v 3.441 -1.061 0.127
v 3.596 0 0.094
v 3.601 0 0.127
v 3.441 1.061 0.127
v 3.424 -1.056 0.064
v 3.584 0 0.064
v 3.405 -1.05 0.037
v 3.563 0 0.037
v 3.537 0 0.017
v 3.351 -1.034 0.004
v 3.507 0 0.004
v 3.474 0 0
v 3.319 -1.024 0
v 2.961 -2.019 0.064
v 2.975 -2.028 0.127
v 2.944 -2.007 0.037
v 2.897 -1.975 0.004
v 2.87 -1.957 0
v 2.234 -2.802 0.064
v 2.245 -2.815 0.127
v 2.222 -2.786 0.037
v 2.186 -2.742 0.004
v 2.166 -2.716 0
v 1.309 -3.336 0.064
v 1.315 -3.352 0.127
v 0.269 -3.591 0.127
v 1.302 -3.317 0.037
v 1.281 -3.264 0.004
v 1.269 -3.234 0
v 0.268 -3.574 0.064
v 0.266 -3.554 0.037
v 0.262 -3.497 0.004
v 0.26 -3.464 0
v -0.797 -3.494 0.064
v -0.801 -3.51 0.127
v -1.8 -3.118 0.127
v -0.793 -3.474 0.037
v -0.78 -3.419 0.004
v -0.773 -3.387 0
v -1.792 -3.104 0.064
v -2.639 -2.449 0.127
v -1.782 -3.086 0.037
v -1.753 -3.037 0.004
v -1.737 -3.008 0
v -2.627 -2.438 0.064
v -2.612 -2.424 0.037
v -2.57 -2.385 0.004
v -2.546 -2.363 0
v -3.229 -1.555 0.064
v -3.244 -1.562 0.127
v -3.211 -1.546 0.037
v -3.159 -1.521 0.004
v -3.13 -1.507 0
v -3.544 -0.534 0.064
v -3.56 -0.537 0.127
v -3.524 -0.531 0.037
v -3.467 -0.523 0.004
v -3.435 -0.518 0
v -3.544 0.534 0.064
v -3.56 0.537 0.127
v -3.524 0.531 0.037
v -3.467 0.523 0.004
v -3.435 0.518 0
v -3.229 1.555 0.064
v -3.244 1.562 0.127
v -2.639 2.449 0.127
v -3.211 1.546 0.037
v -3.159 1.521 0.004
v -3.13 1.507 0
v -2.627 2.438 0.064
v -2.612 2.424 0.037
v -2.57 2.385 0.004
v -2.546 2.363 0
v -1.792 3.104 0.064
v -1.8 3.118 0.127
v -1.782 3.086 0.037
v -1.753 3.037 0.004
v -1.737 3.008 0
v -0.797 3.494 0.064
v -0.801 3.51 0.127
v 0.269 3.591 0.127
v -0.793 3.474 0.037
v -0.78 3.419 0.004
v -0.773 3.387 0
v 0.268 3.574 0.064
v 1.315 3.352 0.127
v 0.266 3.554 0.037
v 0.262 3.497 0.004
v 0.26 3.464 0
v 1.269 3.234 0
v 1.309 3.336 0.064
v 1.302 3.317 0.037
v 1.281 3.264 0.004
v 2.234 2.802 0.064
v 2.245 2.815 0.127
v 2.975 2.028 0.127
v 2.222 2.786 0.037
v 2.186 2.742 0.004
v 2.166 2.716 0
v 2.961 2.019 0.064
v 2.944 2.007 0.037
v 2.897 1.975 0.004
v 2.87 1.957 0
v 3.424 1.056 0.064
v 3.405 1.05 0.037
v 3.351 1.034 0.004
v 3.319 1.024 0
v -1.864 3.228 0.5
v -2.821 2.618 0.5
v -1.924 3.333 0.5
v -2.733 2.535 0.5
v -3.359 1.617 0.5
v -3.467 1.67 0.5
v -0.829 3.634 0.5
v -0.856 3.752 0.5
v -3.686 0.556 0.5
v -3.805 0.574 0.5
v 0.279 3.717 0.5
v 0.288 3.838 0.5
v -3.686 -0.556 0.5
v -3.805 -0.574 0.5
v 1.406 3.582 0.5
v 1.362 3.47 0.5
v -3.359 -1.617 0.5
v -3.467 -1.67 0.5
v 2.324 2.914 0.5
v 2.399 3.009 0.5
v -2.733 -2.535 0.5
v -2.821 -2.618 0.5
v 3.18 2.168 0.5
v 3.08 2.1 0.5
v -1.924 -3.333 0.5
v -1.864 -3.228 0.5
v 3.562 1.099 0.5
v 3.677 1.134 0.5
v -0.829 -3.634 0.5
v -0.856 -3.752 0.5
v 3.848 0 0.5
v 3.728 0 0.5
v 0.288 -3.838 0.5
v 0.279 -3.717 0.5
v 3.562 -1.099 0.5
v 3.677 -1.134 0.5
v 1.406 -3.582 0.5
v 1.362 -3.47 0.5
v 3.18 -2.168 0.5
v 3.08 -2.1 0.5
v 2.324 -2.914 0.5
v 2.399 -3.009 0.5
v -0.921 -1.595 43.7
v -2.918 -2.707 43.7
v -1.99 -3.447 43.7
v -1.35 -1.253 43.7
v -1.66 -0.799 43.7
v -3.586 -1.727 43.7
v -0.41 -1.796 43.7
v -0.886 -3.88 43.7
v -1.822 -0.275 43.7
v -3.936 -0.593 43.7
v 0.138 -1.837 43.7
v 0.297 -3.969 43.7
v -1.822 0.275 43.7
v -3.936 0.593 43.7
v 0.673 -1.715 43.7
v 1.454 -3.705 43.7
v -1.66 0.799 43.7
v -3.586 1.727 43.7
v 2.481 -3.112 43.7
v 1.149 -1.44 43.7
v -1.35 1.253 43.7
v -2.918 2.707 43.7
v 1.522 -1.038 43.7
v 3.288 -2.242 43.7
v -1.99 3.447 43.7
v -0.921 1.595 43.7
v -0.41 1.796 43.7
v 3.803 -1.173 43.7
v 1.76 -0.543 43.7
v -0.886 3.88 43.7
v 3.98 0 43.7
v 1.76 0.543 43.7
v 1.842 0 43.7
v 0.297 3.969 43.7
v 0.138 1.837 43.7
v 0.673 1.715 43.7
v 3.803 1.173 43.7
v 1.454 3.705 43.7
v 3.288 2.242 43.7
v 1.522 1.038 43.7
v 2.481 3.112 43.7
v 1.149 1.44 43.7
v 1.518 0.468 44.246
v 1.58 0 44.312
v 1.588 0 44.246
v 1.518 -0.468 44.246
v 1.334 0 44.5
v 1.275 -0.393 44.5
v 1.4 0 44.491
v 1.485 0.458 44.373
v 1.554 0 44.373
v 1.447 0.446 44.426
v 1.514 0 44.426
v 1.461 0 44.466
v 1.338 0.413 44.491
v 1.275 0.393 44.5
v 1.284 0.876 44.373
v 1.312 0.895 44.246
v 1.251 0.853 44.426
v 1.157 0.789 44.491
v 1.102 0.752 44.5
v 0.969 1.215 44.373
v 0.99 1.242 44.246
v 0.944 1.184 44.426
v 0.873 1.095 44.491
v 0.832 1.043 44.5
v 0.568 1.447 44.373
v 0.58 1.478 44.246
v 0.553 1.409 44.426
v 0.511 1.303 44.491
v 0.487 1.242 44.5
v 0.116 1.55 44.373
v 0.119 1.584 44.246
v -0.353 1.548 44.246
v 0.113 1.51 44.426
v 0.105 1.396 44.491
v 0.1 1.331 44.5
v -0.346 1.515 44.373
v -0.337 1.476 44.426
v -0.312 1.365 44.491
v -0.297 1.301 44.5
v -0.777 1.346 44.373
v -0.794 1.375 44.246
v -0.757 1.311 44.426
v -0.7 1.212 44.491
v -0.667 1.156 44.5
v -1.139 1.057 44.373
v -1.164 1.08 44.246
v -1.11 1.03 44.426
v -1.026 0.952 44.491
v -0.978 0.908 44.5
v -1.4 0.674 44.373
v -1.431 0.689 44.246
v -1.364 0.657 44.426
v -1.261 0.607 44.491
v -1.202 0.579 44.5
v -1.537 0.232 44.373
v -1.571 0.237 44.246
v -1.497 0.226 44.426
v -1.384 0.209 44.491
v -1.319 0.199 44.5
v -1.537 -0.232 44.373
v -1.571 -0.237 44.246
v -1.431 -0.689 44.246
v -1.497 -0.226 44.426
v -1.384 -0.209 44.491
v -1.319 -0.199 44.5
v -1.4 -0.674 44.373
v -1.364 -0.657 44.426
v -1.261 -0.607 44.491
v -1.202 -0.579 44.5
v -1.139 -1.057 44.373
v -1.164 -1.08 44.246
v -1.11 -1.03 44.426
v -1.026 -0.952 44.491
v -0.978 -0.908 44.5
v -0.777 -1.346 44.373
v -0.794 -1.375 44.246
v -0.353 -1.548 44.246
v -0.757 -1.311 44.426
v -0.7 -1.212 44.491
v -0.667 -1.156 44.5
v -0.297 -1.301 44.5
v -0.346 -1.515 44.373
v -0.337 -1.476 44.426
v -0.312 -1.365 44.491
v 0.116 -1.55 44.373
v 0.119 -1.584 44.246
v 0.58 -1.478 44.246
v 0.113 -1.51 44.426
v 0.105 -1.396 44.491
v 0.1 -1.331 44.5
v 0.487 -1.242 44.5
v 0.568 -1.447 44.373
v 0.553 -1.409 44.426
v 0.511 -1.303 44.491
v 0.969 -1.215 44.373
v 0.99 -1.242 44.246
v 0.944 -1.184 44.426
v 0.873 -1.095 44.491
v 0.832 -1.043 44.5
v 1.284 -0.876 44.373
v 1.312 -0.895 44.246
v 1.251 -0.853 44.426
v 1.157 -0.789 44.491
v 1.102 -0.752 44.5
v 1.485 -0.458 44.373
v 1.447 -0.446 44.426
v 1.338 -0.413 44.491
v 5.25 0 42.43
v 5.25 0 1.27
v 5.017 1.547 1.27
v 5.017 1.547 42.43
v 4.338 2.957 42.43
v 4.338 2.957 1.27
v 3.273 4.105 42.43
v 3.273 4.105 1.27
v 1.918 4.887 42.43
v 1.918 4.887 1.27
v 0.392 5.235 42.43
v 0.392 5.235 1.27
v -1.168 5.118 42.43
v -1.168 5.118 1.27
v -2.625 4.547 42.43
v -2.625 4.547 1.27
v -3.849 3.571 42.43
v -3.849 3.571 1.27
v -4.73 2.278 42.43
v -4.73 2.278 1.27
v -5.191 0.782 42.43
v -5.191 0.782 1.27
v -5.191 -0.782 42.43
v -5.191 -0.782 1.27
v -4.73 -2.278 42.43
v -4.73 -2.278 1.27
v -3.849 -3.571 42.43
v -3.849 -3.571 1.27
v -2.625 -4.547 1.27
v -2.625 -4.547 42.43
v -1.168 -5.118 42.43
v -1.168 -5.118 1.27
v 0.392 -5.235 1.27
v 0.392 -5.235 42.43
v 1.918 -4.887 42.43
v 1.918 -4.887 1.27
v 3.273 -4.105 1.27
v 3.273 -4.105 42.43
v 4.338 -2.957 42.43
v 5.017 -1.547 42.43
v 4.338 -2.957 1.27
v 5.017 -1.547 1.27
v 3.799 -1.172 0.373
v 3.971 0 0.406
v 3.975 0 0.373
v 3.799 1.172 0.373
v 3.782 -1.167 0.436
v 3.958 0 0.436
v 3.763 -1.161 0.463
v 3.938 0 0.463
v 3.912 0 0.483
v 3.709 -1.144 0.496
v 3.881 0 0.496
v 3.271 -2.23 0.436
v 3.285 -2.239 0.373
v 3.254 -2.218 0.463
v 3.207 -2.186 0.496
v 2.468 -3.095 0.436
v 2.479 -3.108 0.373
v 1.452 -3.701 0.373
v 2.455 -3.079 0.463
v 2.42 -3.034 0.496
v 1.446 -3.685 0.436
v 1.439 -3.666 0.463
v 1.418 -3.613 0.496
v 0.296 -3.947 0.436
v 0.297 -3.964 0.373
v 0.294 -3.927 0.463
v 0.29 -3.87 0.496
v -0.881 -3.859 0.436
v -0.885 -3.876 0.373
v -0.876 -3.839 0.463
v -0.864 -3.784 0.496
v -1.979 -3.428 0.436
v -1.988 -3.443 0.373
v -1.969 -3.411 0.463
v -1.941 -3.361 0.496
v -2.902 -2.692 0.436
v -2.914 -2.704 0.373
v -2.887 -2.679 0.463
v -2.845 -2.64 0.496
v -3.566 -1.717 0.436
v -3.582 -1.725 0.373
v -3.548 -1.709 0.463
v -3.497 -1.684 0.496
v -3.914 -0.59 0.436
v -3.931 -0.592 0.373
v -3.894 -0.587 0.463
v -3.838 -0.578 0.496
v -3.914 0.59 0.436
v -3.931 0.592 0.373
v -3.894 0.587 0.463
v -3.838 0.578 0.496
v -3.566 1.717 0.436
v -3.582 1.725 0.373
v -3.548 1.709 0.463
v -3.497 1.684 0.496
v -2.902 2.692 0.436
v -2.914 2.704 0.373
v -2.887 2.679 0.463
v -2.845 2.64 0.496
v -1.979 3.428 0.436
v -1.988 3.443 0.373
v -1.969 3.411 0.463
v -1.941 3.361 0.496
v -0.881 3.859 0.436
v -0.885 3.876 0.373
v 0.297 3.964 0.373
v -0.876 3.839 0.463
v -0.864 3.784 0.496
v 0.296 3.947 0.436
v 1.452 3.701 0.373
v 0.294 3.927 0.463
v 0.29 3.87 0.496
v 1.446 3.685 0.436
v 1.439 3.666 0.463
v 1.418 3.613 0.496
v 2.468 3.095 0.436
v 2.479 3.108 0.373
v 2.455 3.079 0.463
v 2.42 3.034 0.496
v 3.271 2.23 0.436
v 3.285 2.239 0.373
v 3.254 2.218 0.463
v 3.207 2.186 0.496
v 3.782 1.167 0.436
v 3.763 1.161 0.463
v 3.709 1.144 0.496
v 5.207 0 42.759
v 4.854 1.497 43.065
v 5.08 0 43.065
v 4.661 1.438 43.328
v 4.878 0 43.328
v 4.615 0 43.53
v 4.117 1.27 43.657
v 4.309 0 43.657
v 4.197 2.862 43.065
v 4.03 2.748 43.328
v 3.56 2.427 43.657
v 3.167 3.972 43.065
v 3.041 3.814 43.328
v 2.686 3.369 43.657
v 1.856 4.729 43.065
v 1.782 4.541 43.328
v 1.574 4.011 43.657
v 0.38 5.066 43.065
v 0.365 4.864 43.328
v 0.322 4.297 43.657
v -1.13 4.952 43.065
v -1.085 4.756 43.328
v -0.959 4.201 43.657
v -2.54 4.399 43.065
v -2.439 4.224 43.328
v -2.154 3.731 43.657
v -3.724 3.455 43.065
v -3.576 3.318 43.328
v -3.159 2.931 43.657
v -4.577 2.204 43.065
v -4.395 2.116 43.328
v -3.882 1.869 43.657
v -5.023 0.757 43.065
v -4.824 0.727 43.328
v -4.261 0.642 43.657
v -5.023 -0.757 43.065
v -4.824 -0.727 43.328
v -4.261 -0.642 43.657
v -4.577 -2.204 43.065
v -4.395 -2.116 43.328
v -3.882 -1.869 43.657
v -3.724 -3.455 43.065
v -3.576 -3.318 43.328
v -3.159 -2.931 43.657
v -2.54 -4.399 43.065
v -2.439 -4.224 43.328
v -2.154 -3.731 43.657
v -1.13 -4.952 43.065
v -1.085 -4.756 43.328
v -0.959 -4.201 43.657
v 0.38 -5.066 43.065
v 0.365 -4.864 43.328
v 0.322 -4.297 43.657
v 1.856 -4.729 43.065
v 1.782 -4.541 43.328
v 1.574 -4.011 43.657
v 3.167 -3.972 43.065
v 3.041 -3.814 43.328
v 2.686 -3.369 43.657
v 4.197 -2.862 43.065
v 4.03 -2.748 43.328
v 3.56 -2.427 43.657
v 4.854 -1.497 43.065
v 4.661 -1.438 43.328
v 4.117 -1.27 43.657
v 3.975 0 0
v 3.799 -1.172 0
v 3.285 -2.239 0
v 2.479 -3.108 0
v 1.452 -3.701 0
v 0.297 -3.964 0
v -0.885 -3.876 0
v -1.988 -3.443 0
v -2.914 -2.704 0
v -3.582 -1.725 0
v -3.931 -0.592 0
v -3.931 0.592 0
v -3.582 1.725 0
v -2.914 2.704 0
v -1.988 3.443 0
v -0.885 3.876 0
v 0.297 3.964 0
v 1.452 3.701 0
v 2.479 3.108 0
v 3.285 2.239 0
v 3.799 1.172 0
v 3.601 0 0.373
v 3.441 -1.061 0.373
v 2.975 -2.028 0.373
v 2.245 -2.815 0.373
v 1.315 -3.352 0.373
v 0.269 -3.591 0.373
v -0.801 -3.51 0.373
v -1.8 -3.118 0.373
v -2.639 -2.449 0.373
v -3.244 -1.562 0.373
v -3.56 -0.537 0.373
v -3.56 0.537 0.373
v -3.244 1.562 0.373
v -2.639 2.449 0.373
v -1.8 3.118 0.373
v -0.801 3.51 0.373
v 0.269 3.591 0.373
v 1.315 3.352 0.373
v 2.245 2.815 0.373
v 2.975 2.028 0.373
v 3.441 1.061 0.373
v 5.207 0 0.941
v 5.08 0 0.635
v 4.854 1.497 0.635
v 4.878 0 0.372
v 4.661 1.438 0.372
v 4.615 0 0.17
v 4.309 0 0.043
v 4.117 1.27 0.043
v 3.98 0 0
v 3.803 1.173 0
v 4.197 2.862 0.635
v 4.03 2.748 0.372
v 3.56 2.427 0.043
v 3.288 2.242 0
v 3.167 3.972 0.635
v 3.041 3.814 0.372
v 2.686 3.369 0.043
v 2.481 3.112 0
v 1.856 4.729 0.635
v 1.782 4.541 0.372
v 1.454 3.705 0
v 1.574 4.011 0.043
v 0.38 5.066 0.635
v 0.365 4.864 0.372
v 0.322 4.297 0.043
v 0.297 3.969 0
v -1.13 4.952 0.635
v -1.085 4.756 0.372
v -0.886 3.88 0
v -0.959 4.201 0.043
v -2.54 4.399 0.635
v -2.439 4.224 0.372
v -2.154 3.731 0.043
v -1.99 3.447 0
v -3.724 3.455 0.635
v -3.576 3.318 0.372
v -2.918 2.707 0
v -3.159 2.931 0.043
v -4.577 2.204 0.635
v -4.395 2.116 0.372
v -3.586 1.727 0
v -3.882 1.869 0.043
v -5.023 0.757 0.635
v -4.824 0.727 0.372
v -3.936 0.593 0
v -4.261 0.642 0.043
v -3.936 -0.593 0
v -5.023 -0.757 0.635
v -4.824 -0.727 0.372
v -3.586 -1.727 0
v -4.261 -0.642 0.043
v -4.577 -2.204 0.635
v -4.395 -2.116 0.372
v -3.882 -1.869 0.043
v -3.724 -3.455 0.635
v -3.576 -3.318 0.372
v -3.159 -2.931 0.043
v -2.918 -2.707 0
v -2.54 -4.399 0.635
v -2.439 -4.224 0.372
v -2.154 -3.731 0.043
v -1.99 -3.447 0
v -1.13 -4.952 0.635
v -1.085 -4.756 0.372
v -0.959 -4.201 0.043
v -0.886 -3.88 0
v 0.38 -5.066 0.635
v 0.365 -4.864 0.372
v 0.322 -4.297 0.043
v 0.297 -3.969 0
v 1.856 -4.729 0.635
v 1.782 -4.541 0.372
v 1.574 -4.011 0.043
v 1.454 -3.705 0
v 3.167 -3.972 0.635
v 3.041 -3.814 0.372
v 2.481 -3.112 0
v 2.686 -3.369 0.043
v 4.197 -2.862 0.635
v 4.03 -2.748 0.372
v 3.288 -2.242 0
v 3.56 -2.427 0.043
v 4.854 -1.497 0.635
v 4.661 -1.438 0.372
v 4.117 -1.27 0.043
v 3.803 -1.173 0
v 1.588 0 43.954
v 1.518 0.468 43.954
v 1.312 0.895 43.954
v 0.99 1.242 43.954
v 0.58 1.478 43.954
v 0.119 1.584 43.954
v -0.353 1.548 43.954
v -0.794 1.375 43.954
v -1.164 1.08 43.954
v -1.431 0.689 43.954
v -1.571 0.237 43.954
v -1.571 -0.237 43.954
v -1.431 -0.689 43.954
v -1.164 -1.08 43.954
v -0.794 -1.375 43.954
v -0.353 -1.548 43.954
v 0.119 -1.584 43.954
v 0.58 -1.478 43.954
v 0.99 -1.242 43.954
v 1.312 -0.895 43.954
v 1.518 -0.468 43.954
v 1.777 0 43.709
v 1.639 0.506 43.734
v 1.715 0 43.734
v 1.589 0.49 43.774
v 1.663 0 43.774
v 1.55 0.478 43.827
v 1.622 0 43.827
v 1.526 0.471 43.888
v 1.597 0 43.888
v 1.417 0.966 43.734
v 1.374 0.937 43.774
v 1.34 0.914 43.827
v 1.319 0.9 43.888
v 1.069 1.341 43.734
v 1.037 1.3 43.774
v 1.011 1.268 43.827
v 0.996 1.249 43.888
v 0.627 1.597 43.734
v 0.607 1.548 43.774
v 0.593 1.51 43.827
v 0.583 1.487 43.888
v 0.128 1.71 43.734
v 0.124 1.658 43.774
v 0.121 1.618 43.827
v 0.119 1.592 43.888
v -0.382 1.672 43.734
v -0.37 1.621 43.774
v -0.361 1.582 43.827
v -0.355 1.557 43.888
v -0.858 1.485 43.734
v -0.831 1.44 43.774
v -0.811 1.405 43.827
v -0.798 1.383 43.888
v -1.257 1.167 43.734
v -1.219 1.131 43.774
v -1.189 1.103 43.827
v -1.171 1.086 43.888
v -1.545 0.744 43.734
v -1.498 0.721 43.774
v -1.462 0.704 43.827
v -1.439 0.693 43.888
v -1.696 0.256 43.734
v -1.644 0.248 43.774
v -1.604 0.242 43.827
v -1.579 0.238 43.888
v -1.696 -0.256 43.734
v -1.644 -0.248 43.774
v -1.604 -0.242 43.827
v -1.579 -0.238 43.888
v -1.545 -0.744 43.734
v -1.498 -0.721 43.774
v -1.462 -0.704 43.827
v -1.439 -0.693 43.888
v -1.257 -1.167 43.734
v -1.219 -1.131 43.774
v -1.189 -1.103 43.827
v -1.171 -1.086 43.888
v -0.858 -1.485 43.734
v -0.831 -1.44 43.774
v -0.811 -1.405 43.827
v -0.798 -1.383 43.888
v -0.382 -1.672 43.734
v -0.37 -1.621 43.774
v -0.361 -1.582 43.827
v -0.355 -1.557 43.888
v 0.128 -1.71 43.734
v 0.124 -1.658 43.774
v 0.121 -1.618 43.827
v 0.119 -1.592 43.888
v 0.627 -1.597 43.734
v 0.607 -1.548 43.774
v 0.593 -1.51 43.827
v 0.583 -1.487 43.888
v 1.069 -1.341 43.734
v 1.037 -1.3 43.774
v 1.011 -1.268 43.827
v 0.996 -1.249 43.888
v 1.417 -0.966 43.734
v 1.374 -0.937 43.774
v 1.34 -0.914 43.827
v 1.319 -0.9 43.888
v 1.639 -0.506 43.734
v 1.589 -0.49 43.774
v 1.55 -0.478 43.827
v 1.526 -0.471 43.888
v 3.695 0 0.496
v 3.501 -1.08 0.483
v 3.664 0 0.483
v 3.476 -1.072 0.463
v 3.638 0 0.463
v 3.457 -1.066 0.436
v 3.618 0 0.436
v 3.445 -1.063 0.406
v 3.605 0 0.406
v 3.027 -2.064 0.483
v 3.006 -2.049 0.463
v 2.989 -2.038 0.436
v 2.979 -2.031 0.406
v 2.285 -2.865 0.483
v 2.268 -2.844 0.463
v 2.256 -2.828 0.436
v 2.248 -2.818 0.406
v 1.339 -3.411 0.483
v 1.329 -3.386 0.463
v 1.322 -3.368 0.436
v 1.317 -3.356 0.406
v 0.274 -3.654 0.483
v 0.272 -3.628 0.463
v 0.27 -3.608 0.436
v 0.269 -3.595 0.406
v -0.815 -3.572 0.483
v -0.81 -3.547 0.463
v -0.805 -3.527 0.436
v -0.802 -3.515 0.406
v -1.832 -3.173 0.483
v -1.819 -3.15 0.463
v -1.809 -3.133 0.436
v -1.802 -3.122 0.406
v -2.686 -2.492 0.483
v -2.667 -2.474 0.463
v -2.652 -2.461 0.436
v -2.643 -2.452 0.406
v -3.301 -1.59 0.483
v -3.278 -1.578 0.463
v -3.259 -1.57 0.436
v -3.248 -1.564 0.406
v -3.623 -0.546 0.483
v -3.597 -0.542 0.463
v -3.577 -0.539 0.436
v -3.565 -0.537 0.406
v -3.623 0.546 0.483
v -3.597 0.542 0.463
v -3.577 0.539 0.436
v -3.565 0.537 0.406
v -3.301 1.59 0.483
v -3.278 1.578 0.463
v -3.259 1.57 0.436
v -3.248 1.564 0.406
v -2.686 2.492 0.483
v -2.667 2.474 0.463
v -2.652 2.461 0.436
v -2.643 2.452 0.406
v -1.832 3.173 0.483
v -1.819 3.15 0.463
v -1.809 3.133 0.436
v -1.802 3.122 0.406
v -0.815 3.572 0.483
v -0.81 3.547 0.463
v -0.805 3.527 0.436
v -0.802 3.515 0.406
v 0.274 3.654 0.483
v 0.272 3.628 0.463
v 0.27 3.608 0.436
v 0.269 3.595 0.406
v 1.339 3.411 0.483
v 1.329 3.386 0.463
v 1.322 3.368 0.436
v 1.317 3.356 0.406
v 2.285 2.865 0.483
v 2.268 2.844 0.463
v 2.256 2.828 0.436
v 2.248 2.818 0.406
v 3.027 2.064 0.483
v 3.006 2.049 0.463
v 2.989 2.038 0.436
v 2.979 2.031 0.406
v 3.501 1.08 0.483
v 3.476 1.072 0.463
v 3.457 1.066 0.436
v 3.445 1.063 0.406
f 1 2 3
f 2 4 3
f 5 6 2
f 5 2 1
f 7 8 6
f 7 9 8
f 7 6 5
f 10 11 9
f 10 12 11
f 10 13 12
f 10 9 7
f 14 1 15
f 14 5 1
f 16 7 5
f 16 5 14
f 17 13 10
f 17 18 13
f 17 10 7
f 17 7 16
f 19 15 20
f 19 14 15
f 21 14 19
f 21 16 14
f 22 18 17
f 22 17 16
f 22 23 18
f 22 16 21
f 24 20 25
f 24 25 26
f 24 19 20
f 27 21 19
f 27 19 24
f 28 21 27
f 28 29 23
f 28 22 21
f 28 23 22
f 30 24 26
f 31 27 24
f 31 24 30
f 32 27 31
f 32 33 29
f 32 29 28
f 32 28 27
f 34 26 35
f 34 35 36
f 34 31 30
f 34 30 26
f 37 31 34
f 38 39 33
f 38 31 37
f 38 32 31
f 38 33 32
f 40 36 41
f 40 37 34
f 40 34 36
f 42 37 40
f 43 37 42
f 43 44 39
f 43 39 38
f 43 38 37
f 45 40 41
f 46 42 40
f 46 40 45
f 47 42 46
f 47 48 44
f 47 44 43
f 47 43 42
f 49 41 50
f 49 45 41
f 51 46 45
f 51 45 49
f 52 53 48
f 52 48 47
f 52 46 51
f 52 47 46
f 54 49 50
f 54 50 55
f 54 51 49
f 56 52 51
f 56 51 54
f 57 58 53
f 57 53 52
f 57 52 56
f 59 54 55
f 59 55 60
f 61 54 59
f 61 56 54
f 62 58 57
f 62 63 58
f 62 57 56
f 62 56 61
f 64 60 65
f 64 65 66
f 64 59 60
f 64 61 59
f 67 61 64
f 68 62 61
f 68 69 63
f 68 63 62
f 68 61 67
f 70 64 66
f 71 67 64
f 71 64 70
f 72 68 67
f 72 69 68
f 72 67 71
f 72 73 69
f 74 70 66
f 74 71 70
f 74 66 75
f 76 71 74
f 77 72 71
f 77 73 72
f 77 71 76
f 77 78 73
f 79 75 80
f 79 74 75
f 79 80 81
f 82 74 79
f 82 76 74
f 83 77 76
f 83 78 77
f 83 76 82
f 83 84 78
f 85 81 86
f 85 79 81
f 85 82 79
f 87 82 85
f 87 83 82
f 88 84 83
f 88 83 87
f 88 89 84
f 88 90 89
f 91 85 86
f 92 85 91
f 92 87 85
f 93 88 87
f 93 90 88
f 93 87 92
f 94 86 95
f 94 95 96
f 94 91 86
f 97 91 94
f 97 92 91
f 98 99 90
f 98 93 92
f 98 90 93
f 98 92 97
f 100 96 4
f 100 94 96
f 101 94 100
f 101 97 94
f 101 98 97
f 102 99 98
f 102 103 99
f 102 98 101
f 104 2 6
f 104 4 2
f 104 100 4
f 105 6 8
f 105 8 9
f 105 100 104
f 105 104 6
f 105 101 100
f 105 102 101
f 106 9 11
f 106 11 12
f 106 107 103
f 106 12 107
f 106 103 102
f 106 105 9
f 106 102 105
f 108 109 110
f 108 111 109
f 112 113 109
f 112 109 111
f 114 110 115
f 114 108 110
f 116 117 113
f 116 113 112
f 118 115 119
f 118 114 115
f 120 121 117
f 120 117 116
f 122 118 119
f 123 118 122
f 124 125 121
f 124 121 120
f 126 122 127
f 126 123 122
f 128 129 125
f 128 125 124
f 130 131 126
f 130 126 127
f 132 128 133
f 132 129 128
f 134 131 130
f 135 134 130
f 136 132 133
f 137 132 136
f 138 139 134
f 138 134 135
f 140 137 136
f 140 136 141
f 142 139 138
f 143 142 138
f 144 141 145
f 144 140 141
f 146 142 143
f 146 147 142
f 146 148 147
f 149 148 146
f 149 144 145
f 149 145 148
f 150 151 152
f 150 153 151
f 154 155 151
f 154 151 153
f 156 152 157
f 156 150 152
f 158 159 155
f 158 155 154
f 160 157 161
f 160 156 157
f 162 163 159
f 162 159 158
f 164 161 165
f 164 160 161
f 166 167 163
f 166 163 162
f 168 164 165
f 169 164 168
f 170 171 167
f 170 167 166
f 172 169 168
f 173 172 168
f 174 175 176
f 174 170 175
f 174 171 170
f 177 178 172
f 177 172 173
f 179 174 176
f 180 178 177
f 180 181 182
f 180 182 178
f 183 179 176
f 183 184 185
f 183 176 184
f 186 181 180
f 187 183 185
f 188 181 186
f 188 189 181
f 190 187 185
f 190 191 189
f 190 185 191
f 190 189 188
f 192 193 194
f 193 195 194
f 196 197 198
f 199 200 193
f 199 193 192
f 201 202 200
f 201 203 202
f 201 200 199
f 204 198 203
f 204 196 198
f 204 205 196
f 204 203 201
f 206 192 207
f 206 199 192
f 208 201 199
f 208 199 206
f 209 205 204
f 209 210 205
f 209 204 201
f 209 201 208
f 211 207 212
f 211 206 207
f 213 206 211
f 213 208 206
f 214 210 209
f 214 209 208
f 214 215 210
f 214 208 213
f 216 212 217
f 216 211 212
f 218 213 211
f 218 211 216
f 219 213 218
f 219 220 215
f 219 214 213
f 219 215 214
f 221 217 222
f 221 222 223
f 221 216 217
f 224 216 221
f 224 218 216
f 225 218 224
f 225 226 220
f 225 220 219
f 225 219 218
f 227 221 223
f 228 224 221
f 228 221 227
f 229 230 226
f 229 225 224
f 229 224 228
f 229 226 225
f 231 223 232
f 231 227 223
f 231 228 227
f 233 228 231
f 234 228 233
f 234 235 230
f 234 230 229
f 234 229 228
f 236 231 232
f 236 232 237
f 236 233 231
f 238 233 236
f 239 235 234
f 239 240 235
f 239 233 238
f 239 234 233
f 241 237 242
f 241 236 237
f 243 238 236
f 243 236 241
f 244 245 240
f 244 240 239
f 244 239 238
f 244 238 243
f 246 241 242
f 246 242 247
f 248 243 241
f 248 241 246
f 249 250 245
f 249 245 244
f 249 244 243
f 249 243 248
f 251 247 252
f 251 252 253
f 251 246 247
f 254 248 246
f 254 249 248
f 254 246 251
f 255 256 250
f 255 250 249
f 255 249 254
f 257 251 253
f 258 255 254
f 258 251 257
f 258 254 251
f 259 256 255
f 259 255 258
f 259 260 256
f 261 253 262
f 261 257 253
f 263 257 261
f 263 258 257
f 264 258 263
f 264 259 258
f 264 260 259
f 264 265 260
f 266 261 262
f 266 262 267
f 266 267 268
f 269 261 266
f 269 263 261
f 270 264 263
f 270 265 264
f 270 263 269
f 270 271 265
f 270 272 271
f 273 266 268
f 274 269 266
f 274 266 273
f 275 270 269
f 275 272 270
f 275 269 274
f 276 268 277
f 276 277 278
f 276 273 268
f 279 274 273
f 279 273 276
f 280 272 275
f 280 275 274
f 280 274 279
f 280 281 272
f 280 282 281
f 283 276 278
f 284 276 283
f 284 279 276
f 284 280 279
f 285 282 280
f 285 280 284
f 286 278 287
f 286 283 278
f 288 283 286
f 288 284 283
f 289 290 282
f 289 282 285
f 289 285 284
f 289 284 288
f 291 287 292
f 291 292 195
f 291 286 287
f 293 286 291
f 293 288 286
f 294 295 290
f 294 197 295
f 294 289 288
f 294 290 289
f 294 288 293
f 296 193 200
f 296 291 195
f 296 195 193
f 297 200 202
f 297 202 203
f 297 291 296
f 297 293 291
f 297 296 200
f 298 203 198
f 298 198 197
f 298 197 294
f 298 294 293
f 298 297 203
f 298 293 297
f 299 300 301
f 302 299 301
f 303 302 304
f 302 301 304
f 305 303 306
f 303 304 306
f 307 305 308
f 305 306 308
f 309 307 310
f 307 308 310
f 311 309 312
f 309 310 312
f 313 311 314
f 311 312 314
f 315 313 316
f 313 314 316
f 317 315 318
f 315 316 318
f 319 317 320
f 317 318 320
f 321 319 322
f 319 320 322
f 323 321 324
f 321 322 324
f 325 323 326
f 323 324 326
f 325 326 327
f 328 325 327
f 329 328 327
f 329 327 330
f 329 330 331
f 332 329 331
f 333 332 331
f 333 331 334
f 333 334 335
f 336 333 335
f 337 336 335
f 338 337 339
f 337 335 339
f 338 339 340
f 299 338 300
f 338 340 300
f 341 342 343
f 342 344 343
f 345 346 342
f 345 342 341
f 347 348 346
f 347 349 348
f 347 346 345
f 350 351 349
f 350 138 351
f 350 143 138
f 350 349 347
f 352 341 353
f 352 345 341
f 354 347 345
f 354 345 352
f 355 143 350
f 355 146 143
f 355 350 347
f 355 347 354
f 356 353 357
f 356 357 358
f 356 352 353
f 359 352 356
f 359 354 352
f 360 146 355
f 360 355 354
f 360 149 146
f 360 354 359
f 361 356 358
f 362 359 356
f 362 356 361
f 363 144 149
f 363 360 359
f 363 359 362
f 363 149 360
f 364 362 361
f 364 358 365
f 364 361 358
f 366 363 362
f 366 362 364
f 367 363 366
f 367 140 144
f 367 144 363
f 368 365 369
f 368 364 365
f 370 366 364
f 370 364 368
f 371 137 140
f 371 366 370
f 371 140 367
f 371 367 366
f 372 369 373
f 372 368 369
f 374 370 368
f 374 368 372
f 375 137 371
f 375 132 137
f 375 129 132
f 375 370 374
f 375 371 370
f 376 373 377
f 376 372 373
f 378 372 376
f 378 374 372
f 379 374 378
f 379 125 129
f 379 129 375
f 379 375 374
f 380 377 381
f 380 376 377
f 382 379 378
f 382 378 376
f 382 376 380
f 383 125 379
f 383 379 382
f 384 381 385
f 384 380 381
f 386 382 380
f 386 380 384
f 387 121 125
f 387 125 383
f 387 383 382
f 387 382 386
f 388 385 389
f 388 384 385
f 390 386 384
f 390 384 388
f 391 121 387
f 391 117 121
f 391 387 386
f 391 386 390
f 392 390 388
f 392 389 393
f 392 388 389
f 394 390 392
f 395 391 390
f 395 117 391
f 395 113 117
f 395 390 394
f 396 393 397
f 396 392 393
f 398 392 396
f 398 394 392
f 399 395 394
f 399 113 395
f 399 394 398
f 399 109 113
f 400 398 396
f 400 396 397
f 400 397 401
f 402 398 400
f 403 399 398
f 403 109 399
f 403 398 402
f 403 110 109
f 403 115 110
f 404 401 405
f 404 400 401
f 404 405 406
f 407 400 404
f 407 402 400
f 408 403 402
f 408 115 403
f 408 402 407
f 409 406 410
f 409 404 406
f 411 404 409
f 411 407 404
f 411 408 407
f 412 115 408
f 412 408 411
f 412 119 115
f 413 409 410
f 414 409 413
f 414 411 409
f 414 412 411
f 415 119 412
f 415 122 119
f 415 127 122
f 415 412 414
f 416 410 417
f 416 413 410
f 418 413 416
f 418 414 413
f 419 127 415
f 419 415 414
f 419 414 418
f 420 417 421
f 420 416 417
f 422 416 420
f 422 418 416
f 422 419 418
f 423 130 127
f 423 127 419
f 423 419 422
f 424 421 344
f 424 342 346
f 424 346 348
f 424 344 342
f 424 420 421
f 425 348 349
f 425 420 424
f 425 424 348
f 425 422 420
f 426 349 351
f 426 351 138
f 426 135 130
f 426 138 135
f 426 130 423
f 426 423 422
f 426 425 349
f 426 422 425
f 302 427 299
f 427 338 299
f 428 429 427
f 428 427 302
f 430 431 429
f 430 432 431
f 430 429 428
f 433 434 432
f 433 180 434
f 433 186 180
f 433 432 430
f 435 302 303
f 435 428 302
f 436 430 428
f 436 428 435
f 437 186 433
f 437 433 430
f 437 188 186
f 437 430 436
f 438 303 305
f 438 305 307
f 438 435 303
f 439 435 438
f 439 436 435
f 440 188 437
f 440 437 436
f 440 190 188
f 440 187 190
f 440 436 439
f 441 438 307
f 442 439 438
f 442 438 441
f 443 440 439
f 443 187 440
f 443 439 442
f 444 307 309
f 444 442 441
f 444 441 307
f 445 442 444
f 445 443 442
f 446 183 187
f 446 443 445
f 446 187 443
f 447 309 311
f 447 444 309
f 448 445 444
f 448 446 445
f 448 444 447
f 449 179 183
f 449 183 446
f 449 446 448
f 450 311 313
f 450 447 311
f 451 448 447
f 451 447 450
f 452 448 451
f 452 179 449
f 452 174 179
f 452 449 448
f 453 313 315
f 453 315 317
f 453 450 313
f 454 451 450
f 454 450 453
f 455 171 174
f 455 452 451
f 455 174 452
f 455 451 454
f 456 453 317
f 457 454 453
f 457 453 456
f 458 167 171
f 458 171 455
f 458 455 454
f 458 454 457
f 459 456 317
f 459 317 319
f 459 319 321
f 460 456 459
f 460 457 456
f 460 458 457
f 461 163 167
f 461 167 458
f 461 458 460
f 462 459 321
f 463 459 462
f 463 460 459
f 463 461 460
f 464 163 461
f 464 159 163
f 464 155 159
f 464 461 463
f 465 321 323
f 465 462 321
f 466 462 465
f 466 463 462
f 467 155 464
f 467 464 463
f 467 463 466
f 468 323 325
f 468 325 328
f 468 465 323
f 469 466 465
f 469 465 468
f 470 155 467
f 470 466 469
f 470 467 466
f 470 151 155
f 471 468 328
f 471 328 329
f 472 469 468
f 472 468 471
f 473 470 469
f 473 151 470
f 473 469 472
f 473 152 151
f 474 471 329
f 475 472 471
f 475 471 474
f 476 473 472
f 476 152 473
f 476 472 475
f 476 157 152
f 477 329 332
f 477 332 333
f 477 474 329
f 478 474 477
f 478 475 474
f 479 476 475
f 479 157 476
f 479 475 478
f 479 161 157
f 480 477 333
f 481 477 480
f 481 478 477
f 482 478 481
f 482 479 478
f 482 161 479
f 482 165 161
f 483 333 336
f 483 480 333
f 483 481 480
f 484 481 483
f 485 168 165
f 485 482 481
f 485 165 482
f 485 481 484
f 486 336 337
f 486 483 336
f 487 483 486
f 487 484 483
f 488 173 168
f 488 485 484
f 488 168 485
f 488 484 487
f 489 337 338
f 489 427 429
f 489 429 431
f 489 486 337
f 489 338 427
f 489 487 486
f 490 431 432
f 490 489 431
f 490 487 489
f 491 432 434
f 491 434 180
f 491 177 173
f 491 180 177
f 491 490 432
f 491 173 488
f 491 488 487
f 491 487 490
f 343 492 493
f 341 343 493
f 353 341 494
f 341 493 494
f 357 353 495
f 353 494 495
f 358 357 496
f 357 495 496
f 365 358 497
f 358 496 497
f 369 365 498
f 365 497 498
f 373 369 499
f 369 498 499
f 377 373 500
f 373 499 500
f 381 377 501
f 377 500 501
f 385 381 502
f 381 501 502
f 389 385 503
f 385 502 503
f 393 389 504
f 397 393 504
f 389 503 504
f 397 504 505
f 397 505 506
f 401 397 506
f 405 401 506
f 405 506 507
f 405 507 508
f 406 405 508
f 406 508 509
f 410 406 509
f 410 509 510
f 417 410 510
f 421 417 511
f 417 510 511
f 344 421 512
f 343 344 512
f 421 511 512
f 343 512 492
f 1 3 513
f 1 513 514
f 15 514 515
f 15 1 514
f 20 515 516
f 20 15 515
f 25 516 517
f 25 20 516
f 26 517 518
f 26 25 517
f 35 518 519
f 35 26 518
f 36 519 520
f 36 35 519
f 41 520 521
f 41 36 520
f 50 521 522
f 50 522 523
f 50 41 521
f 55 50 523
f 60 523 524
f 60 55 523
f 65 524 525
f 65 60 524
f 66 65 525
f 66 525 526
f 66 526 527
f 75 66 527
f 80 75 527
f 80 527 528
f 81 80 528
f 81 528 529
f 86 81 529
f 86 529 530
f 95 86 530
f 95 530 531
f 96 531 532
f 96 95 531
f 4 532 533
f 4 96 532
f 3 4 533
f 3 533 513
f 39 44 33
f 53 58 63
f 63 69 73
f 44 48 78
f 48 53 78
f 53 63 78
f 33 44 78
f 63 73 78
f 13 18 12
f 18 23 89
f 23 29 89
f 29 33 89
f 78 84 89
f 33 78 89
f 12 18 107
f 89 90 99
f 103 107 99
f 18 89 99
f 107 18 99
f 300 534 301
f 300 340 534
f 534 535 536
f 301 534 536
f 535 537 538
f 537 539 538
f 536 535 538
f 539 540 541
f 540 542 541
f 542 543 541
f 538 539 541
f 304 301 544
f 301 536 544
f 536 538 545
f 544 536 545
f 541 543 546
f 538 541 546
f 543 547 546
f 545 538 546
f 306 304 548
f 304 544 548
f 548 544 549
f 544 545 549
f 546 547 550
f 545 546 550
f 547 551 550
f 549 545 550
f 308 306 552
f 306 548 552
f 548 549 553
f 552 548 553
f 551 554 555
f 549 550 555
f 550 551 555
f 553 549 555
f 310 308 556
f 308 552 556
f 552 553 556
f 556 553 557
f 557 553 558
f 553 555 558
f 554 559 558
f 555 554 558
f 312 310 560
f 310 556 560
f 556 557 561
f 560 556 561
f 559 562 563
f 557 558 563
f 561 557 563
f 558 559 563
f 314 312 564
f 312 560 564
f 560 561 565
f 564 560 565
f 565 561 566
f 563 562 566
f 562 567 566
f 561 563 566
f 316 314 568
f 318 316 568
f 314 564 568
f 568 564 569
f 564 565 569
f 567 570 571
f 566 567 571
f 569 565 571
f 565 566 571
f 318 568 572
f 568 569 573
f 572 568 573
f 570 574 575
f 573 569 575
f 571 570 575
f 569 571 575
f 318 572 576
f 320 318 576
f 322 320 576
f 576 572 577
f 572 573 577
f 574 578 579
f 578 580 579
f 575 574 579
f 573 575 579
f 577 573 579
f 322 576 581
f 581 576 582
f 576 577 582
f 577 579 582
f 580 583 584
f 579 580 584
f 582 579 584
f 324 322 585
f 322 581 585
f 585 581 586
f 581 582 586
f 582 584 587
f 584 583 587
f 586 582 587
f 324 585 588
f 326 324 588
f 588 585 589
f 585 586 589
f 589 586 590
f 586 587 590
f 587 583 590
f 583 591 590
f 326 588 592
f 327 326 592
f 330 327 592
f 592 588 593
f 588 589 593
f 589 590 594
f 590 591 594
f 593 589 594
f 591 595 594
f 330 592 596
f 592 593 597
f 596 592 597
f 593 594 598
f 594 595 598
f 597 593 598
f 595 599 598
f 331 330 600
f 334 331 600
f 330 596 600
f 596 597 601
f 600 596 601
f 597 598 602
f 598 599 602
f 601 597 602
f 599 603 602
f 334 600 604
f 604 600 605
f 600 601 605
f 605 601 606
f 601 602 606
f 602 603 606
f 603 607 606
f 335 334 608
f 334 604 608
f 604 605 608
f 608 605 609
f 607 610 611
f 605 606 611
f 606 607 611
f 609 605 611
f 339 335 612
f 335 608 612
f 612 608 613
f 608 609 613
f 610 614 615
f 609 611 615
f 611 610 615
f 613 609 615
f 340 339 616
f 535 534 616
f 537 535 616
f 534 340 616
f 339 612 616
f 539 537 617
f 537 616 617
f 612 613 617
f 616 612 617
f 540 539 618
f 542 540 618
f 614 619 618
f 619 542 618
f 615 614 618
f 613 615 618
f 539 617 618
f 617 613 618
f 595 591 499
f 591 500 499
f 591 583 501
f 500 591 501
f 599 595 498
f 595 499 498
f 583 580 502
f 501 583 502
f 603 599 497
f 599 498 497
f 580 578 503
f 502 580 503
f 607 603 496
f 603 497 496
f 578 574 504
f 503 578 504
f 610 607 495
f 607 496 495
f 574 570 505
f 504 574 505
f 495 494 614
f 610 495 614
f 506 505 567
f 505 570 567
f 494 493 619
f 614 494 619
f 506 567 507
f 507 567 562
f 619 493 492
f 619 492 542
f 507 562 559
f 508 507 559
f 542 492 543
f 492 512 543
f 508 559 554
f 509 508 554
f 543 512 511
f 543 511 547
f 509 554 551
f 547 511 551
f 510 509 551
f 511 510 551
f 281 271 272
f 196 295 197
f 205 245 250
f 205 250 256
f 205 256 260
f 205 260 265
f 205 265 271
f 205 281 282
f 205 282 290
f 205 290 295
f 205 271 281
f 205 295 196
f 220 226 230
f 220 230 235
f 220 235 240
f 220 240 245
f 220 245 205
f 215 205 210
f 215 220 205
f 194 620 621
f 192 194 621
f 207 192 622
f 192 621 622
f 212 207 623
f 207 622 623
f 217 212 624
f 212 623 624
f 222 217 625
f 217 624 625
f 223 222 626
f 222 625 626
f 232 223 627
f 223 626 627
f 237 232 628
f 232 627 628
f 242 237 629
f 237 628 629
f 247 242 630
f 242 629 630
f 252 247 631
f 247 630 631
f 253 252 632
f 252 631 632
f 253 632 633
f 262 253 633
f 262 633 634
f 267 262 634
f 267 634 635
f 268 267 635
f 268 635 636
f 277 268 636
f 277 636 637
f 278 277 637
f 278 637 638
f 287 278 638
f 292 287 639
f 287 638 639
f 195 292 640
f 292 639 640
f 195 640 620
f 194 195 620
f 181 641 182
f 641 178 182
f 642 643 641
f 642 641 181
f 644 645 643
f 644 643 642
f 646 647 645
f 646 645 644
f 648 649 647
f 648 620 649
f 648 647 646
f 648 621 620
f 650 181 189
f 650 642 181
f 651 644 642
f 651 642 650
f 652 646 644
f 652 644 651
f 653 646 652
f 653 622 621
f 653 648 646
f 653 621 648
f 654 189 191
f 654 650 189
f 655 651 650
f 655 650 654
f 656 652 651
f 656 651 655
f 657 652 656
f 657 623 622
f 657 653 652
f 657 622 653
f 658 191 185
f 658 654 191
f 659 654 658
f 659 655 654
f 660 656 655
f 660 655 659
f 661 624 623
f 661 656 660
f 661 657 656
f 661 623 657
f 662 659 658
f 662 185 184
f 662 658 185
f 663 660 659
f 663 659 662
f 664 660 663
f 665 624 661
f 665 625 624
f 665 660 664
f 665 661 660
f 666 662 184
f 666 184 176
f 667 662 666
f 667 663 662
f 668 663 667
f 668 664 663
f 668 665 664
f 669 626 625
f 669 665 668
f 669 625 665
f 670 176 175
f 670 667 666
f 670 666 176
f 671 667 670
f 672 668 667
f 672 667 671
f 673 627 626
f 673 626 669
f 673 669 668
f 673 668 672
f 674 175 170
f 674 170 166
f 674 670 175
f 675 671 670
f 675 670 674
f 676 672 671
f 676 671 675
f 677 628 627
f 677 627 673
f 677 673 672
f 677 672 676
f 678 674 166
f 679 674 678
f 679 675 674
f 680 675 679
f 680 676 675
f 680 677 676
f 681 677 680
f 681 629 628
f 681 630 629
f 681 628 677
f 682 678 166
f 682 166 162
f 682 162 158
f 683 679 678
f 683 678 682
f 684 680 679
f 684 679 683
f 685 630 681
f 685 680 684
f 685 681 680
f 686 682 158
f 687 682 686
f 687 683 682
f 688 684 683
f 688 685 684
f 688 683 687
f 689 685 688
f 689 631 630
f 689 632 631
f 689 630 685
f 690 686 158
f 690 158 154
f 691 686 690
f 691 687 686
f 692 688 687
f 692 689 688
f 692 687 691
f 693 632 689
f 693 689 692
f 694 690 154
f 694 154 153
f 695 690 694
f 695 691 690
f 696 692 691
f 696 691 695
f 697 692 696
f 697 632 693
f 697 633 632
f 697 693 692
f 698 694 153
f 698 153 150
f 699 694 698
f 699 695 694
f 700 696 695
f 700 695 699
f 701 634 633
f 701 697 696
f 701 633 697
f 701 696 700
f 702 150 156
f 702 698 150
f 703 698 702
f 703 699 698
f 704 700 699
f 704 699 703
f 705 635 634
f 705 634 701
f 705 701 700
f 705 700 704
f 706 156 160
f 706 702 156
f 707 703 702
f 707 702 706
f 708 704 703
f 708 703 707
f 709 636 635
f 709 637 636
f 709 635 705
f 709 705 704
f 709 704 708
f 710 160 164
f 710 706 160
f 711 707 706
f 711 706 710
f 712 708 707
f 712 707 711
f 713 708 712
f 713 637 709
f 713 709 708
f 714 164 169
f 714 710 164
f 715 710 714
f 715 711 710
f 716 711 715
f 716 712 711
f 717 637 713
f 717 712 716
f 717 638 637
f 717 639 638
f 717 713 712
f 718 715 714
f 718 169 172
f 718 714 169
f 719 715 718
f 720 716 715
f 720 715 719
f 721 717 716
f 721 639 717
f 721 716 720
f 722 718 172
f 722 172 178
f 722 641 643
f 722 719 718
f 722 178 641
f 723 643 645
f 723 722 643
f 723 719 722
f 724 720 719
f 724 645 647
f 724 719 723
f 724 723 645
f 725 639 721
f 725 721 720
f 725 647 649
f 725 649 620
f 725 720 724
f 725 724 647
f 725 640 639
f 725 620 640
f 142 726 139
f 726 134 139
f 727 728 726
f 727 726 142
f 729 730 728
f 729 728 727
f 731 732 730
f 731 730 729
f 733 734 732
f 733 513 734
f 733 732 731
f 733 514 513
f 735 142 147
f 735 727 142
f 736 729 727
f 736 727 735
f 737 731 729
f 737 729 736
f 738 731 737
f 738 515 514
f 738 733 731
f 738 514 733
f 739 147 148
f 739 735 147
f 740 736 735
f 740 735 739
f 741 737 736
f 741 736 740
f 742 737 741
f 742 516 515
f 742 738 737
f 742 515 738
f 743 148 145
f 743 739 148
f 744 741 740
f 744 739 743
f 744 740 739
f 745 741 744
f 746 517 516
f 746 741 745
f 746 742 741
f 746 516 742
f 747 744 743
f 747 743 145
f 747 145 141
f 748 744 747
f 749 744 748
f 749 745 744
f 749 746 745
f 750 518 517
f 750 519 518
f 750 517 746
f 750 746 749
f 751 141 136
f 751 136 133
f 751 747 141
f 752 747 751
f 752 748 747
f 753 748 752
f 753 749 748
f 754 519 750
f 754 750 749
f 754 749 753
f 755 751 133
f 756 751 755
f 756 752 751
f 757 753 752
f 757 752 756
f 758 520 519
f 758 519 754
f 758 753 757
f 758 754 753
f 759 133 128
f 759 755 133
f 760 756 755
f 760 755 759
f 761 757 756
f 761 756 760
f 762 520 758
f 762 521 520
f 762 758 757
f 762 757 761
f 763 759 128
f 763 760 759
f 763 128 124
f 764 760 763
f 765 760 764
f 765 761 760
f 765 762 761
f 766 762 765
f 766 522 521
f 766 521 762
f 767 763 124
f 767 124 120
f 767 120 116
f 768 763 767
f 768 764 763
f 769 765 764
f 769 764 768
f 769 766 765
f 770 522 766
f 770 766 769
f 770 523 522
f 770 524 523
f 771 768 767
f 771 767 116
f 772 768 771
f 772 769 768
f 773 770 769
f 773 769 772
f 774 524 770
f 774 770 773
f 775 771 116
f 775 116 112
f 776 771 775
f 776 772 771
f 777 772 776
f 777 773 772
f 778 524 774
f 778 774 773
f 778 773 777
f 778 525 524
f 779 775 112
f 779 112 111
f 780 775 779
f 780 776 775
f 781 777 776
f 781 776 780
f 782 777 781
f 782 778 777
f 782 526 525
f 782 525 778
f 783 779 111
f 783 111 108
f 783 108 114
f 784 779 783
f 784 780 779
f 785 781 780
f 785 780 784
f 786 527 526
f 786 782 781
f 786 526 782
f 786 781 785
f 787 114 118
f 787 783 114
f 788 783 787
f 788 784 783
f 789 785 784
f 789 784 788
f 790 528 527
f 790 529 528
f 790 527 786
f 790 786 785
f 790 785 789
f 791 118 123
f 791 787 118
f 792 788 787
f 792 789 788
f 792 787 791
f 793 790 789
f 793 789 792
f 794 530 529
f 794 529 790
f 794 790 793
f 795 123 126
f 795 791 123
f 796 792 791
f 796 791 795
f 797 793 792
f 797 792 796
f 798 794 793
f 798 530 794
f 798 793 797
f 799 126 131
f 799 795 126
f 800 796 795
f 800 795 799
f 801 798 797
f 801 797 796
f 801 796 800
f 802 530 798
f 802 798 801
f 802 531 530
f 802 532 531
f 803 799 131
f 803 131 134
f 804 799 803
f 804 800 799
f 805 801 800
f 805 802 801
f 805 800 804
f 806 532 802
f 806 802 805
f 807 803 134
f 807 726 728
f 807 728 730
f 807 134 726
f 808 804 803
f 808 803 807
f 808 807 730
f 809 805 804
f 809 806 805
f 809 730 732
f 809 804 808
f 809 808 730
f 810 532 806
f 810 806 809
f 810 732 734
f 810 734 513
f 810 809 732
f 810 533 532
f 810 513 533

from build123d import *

# Parameters (mm, degrees)
F0_R     = 5.25
F1_DEPTH = 43.7
F2_R     = 1.5882711699
F3_DEPTH = 0.8
F4_R     = 1.27
F5_R     = 0.254
F6_R     = 3.9753387482
F6_R_2   = 3.600663703
F7_DEPTH = 0.5
F8_R     = 0.127


with BuildPart() as f1:
    # F0 (on Top) → F1 (new body)
    with BuildSketch(Plane.XY):
        Circle(F0_R)
    extrude(amount=F1_DEPTH)

    # F2 (on face) → F3 (join)
    with BuildSketch(Plane.XY.offset(43.7)):
        Circle(F2_R)
    extrude(amount=F3_DEPTH)

    # F4
    f4_edges = [f1.edges().sort_by_distance(p)[0] for p in [
        (-5.25, 0, 43.7),
        (-5.25, 0, 0),
    ]]
    fillet(f4_edges, radius=F4_R)

    # F5
    f5_edges = [f1.edges().sort_by_distance(p)[0] for p in [
        (-1.588271, 0, 44.5),
        (-3.98, 0, 43.7),
        (-1.588271, 0, 43.7),
    ]]
    fillet(f5_edges, radius=F5_R)

    # F6 (on face) → F7 (cut)
    with BuildSketch(Plane(origin=(0, 0, 0), x_dir=(1, 0, 0), z_dir=(0, 0, -1))):
        Circle(F6_R)
        Circle(F6_R_2, mode=Mode.SUBTRACT)
    extrude(amount=-F7_DEPTH, mode=Mode.SUBTRACT)

    # F8
    f8_edges = [f1.edges().sort_by_distance(p)[0] for p in [
        (-3.975339, 0, 0.5),
        (-3.600664, 0, 0.5),
        (-3.600664, 0, 0),
    ]]
    fillet(f8_edges, radius=F8_R)


solid = f1.part
